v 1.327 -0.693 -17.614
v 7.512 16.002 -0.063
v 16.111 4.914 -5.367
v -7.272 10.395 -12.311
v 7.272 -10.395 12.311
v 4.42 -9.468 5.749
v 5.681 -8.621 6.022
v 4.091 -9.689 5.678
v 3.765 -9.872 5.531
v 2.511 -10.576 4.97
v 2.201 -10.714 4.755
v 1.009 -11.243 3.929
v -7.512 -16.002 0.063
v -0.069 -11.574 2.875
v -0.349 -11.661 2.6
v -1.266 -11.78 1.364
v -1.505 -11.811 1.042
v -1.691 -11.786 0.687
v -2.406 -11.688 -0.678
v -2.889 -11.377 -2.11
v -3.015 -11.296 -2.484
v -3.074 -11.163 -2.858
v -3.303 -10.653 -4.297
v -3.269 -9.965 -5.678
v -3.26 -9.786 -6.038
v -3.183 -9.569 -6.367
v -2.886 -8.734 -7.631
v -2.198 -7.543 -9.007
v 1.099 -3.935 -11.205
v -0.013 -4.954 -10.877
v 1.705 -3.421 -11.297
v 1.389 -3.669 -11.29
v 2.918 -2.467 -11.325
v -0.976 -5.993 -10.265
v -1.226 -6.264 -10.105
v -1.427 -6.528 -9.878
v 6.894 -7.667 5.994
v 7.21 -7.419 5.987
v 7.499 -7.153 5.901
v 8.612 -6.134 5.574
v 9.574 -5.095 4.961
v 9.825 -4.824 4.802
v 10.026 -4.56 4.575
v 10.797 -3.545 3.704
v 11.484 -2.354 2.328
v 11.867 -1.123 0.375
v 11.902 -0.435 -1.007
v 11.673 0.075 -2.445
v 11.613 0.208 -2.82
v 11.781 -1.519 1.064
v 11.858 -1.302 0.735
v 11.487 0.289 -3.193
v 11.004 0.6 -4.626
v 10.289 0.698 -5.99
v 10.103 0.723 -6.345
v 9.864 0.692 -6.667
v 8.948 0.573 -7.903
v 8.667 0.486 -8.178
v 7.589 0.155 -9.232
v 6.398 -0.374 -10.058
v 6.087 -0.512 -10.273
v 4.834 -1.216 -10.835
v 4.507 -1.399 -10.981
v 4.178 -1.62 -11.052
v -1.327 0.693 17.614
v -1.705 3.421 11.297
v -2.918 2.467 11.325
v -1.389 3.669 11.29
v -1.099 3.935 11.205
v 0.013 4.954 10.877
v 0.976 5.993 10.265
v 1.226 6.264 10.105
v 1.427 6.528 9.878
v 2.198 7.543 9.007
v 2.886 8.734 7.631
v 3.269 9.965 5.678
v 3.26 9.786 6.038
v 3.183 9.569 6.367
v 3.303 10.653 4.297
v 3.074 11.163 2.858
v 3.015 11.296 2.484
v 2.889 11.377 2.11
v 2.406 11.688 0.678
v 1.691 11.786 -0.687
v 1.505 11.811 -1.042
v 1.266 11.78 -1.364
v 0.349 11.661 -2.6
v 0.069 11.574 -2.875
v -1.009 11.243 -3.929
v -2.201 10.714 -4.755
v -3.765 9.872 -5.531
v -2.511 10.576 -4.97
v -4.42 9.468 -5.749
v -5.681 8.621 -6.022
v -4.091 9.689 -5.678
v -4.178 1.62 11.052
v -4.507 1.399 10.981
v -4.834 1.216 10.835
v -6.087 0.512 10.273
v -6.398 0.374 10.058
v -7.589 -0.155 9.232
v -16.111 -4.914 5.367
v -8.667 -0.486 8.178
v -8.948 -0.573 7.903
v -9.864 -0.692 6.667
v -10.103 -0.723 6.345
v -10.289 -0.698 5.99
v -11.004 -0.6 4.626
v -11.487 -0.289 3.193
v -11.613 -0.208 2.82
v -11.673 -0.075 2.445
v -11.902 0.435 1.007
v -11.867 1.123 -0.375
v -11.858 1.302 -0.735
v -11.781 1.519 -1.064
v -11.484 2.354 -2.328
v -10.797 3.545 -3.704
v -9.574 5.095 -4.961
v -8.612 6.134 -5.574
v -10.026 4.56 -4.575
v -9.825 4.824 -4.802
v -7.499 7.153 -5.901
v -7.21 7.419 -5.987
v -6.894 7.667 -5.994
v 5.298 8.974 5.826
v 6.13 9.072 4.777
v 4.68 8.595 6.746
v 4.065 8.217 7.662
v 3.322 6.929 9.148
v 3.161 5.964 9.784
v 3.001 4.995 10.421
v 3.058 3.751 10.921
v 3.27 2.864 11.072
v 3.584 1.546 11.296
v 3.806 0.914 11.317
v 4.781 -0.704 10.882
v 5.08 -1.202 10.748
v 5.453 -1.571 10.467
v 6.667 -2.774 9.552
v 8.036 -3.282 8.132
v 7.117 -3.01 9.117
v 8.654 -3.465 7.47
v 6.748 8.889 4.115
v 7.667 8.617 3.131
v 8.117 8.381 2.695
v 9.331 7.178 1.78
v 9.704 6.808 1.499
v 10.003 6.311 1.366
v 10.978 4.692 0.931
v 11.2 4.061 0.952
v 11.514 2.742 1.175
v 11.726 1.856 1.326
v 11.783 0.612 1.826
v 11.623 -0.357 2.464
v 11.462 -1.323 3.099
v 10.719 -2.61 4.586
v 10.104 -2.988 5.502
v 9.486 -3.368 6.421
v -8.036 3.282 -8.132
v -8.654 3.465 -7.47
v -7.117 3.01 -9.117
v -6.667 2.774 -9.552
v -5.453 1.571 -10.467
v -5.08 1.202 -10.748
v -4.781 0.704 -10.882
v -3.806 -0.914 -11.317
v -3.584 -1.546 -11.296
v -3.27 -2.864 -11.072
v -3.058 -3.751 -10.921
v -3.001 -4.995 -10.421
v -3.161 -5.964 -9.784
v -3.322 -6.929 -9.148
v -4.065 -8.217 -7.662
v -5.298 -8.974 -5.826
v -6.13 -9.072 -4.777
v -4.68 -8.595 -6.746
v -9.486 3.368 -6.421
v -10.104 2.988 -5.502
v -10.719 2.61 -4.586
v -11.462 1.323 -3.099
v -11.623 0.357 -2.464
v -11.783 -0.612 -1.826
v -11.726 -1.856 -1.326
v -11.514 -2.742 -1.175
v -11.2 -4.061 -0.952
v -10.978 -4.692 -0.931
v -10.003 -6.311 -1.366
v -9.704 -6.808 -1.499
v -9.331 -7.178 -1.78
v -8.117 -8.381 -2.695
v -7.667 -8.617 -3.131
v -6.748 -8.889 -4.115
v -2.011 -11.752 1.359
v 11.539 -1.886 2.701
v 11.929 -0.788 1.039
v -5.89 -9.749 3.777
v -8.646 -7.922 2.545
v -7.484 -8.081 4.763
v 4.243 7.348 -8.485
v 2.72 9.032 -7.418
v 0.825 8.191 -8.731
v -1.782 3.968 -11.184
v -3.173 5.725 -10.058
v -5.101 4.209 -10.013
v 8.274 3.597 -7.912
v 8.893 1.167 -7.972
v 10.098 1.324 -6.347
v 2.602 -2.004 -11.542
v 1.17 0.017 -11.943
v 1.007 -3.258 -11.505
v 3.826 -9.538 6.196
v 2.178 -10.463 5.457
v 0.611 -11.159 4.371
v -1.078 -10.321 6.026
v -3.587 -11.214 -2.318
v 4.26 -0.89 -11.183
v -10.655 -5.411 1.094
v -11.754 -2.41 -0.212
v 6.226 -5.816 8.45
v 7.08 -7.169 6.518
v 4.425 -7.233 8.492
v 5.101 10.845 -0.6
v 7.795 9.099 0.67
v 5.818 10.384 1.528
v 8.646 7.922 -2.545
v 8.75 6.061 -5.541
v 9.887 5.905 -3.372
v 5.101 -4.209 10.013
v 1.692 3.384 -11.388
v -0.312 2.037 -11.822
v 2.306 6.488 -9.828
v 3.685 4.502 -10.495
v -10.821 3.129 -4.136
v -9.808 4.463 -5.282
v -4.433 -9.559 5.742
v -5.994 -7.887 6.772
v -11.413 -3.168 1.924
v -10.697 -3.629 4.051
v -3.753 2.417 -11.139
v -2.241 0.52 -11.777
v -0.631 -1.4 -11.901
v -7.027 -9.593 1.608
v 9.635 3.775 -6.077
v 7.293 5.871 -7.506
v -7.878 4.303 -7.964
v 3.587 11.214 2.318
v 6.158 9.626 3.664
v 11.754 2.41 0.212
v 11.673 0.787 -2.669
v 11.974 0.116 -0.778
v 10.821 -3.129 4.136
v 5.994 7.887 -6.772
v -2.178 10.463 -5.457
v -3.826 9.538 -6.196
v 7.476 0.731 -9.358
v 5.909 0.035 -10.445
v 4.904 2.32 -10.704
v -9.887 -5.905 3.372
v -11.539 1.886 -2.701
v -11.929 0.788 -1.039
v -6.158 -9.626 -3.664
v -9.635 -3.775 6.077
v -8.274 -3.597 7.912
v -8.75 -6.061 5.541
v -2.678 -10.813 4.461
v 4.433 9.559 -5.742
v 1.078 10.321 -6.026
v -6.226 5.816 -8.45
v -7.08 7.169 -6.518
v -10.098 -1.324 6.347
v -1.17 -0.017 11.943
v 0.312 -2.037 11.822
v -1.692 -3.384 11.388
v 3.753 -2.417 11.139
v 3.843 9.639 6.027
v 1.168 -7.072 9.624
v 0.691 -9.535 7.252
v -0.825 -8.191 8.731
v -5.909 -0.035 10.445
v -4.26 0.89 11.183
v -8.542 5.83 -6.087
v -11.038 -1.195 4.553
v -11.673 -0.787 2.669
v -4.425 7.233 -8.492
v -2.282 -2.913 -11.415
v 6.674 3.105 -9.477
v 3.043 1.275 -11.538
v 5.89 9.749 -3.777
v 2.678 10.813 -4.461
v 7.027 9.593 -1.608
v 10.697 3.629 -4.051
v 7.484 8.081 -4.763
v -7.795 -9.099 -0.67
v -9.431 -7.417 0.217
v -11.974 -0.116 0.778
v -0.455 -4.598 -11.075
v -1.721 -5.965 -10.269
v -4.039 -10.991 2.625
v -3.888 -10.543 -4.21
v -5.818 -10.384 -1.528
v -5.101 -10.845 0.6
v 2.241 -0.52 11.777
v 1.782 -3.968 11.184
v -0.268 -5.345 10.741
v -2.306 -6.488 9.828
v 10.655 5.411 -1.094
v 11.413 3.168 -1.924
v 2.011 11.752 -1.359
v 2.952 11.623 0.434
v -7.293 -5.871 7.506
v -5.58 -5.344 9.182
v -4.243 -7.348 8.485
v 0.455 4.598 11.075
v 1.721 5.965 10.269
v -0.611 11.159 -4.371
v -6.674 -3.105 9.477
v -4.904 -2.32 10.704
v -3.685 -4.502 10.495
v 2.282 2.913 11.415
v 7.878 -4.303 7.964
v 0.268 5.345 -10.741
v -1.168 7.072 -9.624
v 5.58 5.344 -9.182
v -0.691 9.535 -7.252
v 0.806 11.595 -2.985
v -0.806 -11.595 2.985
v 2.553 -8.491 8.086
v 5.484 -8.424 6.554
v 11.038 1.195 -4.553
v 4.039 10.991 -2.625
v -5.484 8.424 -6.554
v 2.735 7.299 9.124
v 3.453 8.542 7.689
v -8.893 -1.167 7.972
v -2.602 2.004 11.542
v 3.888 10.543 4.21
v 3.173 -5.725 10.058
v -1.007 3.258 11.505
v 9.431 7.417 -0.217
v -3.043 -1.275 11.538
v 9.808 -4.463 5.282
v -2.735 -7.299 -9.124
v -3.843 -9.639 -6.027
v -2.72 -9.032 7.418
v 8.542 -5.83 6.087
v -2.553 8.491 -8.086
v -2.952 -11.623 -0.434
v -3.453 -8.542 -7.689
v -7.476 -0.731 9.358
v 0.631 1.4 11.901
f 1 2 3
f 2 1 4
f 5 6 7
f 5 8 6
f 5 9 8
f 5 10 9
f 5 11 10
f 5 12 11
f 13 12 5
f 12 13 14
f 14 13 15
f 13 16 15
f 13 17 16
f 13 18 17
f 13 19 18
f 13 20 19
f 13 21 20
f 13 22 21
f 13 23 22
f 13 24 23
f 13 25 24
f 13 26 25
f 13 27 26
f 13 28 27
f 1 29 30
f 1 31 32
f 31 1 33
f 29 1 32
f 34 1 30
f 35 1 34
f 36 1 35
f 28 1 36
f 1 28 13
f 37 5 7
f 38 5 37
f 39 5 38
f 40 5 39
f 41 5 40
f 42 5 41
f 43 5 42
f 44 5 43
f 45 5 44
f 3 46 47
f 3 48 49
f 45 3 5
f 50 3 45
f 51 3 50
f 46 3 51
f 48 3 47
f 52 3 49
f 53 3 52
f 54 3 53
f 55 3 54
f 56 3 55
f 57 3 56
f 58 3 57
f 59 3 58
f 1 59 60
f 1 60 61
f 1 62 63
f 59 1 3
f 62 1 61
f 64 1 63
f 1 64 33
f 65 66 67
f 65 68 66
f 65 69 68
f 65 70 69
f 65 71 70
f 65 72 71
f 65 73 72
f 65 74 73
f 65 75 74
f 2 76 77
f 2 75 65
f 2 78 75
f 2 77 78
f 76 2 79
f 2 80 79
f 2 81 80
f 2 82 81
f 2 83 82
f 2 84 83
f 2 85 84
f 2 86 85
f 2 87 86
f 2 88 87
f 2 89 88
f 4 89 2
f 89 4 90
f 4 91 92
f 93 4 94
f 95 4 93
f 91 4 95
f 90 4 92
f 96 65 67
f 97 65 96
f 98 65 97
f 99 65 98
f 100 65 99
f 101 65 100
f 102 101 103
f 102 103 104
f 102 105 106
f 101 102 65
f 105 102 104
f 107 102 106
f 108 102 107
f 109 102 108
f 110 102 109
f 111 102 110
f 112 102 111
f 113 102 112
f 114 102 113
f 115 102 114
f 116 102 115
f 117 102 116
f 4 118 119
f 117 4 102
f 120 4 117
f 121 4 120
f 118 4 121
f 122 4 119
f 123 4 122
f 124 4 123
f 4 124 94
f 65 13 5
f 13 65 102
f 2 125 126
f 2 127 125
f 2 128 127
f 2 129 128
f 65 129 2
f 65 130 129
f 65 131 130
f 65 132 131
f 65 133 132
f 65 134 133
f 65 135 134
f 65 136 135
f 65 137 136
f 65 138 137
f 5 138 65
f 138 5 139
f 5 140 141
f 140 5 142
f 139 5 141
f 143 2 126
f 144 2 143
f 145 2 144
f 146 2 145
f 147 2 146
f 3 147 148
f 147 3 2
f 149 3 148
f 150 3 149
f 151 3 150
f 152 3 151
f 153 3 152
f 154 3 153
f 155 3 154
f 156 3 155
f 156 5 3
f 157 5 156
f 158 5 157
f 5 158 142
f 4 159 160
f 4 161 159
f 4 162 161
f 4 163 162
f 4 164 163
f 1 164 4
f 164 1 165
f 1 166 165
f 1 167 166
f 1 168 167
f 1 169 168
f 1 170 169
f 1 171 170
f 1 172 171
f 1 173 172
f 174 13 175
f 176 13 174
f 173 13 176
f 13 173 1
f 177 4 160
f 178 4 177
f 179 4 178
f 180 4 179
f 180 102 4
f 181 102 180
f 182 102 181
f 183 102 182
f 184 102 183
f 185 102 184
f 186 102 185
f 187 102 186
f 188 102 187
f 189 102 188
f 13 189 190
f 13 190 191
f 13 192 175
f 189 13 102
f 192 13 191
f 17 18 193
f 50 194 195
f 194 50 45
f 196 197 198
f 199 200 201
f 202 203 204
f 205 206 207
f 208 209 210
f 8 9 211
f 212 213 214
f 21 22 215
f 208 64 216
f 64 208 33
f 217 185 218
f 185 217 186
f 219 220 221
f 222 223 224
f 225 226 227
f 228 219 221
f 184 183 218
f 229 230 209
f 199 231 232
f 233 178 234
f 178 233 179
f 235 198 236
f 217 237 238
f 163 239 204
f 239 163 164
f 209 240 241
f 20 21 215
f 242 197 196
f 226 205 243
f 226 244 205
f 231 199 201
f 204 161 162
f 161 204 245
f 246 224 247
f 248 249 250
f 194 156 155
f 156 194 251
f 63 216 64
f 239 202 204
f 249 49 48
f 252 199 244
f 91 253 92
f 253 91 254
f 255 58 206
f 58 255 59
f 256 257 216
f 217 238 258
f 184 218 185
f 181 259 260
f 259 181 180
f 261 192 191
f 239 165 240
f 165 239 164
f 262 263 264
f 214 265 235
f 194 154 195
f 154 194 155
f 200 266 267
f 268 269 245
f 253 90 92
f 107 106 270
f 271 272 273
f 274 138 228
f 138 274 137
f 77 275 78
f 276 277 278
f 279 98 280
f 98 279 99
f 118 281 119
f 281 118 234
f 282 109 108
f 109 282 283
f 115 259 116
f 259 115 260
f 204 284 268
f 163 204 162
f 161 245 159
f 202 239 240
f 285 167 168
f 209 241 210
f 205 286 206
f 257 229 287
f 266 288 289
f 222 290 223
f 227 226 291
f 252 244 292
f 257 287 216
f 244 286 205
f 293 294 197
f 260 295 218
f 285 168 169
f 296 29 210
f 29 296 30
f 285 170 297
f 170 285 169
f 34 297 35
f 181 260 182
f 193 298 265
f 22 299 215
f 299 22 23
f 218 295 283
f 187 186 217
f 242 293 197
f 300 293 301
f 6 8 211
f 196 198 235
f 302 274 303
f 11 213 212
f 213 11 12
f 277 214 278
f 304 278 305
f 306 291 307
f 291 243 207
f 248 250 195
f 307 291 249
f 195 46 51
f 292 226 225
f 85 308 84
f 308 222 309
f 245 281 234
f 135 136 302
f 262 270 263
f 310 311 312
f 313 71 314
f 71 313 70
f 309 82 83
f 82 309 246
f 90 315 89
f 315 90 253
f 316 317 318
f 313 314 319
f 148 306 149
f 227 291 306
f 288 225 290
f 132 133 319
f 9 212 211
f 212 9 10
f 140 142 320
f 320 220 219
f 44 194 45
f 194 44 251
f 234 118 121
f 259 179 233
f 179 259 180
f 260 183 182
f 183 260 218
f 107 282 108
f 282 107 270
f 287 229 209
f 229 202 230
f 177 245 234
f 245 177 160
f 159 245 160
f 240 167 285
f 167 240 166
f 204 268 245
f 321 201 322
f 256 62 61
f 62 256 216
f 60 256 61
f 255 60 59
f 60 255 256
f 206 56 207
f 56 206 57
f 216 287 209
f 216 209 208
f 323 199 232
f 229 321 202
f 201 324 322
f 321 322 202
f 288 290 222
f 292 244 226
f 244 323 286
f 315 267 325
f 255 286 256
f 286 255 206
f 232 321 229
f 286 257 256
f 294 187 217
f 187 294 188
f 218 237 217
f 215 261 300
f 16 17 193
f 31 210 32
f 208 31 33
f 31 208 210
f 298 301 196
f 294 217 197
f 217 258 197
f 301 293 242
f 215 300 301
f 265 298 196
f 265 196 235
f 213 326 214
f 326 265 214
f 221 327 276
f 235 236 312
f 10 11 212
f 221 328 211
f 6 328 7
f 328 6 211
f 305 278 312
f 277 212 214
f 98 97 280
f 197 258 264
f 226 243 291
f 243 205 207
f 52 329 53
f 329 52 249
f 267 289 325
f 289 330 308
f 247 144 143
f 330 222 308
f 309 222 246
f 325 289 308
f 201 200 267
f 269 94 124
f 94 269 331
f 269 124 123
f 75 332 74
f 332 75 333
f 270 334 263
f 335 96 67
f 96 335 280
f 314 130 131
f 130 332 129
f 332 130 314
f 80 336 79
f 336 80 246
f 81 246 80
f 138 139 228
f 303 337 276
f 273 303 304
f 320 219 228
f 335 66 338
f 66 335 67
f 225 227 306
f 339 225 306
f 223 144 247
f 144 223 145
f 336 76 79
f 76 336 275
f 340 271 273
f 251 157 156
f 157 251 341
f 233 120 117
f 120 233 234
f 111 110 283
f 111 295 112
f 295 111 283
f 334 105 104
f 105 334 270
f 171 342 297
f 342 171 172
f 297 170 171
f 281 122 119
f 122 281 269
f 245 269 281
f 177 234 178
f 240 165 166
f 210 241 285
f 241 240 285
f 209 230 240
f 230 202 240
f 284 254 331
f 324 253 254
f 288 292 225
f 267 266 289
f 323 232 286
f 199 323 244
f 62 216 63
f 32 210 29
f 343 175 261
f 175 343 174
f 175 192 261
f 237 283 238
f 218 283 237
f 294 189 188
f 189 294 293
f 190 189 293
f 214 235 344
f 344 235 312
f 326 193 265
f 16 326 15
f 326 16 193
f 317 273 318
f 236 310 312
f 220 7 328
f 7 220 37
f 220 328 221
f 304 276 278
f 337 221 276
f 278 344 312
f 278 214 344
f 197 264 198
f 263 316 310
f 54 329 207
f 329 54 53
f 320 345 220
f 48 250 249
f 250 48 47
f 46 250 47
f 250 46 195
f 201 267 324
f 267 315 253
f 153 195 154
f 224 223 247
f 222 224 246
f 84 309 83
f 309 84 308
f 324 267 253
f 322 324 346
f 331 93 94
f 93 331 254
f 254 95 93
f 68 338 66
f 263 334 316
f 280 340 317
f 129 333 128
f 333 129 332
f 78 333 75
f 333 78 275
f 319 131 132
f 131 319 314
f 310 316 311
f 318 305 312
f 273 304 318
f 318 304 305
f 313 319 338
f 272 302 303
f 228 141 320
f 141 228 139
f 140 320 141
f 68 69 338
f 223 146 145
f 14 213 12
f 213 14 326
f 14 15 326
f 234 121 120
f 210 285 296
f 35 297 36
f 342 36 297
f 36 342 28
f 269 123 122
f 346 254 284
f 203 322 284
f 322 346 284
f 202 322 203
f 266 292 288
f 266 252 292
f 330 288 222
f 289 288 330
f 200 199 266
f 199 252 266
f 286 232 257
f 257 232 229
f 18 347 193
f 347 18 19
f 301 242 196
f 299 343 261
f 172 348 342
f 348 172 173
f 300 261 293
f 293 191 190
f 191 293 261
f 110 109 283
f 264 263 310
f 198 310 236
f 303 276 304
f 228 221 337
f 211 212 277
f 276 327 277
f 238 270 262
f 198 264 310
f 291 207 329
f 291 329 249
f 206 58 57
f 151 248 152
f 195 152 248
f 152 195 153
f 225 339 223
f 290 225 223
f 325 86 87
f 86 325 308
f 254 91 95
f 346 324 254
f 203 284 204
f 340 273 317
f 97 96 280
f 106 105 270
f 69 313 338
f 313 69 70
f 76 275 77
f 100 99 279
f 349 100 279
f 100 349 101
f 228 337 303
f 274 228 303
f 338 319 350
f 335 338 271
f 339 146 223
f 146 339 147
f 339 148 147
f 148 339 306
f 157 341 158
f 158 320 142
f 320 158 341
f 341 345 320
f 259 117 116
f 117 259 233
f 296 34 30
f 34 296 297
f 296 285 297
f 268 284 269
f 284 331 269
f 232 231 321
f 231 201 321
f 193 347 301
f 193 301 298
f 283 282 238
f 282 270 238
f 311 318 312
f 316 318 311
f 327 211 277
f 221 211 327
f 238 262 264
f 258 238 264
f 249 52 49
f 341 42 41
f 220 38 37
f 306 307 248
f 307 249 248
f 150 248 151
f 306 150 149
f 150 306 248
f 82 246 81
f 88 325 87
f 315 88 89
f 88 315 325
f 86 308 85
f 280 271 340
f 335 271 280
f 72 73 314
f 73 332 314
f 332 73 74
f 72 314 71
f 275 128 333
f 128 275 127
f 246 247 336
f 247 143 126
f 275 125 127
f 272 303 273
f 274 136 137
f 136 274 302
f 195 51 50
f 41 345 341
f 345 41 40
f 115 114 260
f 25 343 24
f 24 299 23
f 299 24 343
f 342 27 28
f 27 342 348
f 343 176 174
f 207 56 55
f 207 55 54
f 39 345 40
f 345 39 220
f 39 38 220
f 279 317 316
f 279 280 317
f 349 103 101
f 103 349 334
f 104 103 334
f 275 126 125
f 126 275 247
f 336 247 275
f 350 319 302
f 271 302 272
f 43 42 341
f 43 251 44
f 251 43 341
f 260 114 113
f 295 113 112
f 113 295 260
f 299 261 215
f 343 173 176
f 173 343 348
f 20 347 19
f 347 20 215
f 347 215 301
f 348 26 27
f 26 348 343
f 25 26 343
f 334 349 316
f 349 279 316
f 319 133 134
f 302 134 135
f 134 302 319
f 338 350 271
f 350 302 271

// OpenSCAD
// Generated by generate_scads.py
rotate([120,45,60]) {
  difference() {
    cube(size=[25,20,15], center=true);
    cylinder(h=5, r=4, center=false);
    sphere(r=12);
    sphere(r=8);
  }
}
